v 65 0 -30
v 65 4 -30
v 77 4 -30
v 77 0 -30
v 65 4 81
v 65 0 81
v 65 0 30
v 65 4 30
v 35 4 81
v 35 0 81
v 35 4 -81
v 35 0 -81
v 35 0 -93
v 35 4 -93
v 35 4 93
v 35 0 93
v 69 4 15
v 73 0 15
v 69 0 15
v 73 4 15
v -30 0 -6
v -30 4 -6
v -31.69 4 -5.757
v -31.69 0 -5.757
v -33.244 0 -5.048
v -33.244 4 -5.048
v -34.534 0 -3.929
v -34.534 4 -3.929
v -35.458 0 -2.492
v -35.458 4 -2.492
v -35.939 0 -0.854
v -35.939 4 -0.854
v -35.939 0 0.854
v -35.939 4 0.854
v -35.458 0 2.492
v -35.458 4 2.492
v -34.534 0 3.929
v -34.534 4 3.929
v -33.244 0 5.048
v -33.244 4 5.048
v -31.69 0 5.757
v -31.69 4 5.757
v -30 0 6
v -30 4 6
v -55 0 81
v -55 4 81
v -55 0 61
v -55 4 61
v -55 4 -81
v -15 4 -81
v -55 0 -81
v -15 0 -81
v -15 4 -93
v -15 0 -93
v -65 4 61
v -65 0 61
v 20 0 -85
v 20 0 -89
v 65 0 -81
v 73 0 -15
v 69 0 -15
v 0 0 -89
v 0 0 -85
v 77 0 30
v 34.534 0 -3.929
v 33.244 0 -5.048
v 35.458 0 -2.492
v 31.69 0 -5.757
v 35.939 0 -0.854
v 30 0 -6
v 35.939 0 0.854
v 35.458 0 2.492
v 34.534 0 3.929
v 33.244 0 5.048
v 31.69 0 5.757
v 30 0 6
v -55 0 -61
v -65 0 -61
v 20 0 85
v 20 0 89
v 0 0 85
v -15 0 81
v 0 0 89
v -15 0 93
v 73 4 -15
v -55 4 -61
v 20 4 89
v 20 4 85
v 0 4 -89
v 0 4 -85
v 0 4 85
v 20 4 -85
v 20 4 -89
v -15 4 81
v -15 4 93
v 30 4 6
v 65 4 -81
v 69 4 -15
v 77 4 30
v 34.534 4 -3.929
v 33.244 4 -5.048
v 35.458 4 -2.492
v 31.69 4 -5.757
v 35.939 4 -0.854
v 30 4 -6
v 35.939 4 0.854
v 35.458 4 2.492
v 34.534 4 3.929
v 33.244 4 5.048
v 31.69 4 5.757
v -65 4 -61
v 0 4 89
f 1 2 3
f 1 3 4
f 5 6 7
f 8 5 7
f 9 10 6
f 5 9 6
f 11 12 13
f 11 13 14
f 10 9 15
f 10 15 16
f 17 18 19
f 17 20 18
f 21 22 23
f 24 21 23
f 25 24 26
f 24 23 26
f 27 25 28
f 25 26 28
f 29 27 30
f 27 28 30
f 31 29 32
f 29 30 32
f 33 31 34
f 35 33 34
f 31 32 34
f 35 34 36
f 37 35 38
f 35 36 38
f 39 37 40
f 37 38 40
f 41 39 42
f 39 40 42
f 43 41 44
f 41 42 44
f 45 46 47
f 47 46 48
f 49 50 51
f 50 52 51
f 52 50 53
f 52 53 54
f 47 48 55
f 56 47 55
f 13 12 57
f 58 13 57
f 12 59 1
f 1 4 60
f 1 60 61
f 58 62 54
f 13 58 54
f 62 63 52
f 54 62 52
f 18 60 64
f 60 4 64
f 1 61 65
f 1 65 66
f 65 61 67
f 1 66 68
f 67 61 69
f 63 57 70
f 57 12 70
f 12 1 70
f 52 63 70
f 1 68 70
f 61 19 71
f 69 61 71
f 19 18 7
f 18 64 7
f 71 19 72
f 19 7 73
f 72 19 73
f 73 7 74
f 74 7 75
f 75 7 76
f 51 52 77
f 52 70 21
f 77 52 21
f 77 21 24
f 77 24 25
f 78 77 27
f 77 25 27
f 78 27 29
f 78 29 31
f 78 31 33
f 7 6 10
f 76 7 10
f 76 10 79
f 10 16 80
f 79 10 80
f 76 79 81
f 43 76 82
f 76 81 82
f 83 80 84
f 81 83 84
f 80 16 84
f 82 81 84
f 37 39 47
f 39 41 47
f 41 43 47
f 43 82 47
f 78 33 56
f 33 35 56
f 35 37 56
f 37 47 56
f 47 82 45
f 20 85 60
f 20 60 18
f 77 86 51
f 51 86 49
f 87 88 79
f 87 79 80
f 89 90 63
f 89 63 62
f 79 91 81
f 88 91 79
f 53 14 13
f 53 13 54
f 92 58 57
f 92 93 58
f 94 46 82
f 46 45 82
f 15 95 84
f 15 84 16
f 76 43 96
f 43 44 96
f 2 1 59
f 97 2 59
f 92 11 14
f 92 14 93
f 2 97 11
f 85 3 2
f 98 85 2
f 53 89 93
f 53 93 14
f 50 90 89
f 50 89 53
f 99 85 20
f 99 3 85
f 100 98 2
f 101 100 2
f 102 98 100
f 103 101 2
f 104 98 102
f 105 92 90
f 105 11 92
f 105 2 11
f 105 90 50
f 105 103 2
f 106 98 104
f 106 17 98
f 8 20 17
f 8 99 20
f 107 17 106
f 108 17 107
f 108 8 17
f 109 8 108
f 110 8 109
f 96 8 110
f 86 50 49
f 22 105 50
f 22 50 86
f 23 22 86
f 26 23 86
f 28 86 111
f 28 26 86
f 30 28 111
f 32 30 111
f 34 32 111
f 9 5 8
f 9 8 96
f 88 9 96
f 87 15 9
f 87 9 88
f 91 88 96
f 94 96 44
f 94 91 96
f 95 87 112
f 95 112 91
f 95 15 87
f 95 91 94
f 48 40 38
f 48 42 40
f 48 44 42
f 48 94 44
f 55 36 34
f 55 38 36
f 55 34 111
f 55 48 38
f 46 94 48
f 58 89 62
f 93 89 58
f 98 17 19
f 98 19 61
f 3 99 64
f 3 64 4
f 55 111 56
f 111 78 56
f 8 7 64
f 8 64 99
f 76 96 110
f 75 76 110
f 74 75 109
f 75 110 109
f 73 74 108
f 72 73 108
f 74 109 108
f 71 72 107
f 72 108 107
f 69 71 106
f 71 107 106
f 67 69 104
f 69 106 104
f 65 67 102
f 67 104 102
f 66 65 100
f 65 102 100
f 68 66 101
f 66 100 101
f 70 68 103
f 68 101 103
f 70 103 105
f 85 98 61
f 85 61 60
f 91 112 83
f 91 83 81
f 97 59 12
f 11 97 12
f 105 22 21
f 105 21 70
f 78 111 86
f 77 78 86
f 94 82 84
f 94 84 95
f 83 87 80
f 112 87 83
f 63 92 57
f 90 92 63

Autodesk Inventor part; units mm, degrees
ref_plane "YZ Plane" through (0, 0, 0) normal (1, 0, 0) x (0, 1, 0)
ref_plane "XZ Plane" through (0, 0, 0) normal (0, 1, 0) x (-1, 0, 0)
ref_plane "XY Plane" through (0, 0, 0) normal (0, 0, 1) x (1, 0, 0)
sketch "Sketch1" plane through (0, 0, 0) normal (0, 1, 0) x (-1, 0, 0)
  line L0 (65, 81) -> (-65, 81)
  line L1 (-65, 81) -> (-65, -81)
  line L2 (-65, -81) -> (65, -81)
  line L3 (65, -81) -> (65, 81)
  point P0 (0, 0)
  point P1 (65, 0)
  point P2 (0, -81)
  dimension "d0" = 162
  dimension "d1" = 130
extrude "Extrusion1" add sketch "Sketch1" along normal blind 4
sketch "Sketch2" plane through (0, 4, 0) normal (0, 1, 0) x (1, 0, 0)
  circle A0 centre (-30, 0) radius 6
  circle A1 centre (30, 0) radius 6
  line L0 (-30, 6) -> (30, 6)
  line L1 (-30, -6) -> (30, -6)
  point P0 (0, 0)
  dimension "d4" = 12
  dimension "d5" = 12
  dimension "d6" = 30
  dimension "d7" = 30
extrude "Extrusion2" cut sketch "Sketch2" against normal through all
sketch "Sketch3" plane through (65, 0, 81) normal (1, 0, 0) x (0, 0, -1)
  line L0 (0, 4) -> (162, 4) projected
  line L1 (0, 0) -> (162, 0) projected
  line L2 (51, 4) -> (111, 4)
  line L3 (111, 4) -> (111, 0)
  line L4 (111, 0) -> (51, 0)
  line L5 (51, 0) -> (51, 4)
  point P0 (81, 0)
  point P1 (81, 0)
  dimension "d10" = 60
  dimension "d11" = 30
extrude "Extrusion3" add sketch "Sketch3" along normal blind 12
sketch "Sketch4" plane through (0, 4, 0) normal (0, 1, 0) x (1, 0, 0)
  line L0 (-65, -81) -> (65, -81) projected
  line L1 (-65, -81) -> (-55, -81)
  line L2 (-55, -81) -> (-55, -61)
  line L3 (-55, -61) -> (-65, -61)
  line L4 (-65, -61) -> (-65, -81)
  point P0 (0, 0)
  dimension "d14" = 20
  dimension "d15" = 10
extrude "Extrusion4" cut sketch "Sketch4" against normal blind 4
mirror "Mirror1" about plane through (0, 0, 0) normal (0, 0, 1) of "Extrusion4"
sketch "Sketch5" plane through (65, 0, 81) normal (0, 0, 1) x (1, 0, 0)
  line L0 (-35, 4) -> (-95, 4) projected
  line L1 (-80, 4) -> (-30, 4)
  line L2 (-30, 4) -> (-30, 0)
  line L3 (-30, 0) -> (-80, 0)
  line L4 (-80, 0) -> (-80, 4)
  line L5 (0, 0) -> (0, 4) projected
  point P0 (-65, 0)
  point P1 (-30, 2)
  point P2 (-80, 2)
  point P3 (0, 2)
  point P4 (-55, 0)
  dimension "d18" = 50
  dimension "d19" = 55
extrude "Extrusion5" add sketch "Sketch5" along normal blind 12
sketch "Sketch6" plane through (0, 4, 0) normal (0, 1, 0) x (1, 0, 0)
  line L0 (0, -85) -> (20, -85)
  line L1 (20, -85) -> (20, -89)
  line L2 (20, -89) -> (0, -89)
  line L3 (0, -89) -> (0, -85)
  line L4 (35, -81) -> (65, -81) projected
  line L5 (35, -81) -> (35, -93) projected
  point P0 (0, 0)
  point P1 (20, -87)
  dimension "d22" = 20
  dimension "d23" = 4
  dimension "d24" = 4
  dimension "d25" = 15
extrude "Extrusion6" cut sketch "Sketch6" against normal blind 12
mirror "Mirror2" about plane through (0, 0, 0) normal (0, 0, 1) of "Extrusion5", "Extrusion6"
sketch "Sketch7" plane through (0, 4, 0) normal (0, 1, 0) x (1, 0, 0)
  line L0 (69, 15) -> (73, 15)
  line L1 (73, 15) -> (73, -15)
  line L2 (73, -15) -> (69, -15)
  line L3 (69, -15) -> (69, 15)
  line L4 (65, 30) -> (65, 81) projected
  point P0 (0, 0)
  point P1 (69, 0)
  dimension "d28" = 4
  dimension "d29" = 4
  dimension "d30" = 30
extrude "Extrusion7" cut sketch "Sketch7" against normal blind 12
properties part number "Parte intermedia"
